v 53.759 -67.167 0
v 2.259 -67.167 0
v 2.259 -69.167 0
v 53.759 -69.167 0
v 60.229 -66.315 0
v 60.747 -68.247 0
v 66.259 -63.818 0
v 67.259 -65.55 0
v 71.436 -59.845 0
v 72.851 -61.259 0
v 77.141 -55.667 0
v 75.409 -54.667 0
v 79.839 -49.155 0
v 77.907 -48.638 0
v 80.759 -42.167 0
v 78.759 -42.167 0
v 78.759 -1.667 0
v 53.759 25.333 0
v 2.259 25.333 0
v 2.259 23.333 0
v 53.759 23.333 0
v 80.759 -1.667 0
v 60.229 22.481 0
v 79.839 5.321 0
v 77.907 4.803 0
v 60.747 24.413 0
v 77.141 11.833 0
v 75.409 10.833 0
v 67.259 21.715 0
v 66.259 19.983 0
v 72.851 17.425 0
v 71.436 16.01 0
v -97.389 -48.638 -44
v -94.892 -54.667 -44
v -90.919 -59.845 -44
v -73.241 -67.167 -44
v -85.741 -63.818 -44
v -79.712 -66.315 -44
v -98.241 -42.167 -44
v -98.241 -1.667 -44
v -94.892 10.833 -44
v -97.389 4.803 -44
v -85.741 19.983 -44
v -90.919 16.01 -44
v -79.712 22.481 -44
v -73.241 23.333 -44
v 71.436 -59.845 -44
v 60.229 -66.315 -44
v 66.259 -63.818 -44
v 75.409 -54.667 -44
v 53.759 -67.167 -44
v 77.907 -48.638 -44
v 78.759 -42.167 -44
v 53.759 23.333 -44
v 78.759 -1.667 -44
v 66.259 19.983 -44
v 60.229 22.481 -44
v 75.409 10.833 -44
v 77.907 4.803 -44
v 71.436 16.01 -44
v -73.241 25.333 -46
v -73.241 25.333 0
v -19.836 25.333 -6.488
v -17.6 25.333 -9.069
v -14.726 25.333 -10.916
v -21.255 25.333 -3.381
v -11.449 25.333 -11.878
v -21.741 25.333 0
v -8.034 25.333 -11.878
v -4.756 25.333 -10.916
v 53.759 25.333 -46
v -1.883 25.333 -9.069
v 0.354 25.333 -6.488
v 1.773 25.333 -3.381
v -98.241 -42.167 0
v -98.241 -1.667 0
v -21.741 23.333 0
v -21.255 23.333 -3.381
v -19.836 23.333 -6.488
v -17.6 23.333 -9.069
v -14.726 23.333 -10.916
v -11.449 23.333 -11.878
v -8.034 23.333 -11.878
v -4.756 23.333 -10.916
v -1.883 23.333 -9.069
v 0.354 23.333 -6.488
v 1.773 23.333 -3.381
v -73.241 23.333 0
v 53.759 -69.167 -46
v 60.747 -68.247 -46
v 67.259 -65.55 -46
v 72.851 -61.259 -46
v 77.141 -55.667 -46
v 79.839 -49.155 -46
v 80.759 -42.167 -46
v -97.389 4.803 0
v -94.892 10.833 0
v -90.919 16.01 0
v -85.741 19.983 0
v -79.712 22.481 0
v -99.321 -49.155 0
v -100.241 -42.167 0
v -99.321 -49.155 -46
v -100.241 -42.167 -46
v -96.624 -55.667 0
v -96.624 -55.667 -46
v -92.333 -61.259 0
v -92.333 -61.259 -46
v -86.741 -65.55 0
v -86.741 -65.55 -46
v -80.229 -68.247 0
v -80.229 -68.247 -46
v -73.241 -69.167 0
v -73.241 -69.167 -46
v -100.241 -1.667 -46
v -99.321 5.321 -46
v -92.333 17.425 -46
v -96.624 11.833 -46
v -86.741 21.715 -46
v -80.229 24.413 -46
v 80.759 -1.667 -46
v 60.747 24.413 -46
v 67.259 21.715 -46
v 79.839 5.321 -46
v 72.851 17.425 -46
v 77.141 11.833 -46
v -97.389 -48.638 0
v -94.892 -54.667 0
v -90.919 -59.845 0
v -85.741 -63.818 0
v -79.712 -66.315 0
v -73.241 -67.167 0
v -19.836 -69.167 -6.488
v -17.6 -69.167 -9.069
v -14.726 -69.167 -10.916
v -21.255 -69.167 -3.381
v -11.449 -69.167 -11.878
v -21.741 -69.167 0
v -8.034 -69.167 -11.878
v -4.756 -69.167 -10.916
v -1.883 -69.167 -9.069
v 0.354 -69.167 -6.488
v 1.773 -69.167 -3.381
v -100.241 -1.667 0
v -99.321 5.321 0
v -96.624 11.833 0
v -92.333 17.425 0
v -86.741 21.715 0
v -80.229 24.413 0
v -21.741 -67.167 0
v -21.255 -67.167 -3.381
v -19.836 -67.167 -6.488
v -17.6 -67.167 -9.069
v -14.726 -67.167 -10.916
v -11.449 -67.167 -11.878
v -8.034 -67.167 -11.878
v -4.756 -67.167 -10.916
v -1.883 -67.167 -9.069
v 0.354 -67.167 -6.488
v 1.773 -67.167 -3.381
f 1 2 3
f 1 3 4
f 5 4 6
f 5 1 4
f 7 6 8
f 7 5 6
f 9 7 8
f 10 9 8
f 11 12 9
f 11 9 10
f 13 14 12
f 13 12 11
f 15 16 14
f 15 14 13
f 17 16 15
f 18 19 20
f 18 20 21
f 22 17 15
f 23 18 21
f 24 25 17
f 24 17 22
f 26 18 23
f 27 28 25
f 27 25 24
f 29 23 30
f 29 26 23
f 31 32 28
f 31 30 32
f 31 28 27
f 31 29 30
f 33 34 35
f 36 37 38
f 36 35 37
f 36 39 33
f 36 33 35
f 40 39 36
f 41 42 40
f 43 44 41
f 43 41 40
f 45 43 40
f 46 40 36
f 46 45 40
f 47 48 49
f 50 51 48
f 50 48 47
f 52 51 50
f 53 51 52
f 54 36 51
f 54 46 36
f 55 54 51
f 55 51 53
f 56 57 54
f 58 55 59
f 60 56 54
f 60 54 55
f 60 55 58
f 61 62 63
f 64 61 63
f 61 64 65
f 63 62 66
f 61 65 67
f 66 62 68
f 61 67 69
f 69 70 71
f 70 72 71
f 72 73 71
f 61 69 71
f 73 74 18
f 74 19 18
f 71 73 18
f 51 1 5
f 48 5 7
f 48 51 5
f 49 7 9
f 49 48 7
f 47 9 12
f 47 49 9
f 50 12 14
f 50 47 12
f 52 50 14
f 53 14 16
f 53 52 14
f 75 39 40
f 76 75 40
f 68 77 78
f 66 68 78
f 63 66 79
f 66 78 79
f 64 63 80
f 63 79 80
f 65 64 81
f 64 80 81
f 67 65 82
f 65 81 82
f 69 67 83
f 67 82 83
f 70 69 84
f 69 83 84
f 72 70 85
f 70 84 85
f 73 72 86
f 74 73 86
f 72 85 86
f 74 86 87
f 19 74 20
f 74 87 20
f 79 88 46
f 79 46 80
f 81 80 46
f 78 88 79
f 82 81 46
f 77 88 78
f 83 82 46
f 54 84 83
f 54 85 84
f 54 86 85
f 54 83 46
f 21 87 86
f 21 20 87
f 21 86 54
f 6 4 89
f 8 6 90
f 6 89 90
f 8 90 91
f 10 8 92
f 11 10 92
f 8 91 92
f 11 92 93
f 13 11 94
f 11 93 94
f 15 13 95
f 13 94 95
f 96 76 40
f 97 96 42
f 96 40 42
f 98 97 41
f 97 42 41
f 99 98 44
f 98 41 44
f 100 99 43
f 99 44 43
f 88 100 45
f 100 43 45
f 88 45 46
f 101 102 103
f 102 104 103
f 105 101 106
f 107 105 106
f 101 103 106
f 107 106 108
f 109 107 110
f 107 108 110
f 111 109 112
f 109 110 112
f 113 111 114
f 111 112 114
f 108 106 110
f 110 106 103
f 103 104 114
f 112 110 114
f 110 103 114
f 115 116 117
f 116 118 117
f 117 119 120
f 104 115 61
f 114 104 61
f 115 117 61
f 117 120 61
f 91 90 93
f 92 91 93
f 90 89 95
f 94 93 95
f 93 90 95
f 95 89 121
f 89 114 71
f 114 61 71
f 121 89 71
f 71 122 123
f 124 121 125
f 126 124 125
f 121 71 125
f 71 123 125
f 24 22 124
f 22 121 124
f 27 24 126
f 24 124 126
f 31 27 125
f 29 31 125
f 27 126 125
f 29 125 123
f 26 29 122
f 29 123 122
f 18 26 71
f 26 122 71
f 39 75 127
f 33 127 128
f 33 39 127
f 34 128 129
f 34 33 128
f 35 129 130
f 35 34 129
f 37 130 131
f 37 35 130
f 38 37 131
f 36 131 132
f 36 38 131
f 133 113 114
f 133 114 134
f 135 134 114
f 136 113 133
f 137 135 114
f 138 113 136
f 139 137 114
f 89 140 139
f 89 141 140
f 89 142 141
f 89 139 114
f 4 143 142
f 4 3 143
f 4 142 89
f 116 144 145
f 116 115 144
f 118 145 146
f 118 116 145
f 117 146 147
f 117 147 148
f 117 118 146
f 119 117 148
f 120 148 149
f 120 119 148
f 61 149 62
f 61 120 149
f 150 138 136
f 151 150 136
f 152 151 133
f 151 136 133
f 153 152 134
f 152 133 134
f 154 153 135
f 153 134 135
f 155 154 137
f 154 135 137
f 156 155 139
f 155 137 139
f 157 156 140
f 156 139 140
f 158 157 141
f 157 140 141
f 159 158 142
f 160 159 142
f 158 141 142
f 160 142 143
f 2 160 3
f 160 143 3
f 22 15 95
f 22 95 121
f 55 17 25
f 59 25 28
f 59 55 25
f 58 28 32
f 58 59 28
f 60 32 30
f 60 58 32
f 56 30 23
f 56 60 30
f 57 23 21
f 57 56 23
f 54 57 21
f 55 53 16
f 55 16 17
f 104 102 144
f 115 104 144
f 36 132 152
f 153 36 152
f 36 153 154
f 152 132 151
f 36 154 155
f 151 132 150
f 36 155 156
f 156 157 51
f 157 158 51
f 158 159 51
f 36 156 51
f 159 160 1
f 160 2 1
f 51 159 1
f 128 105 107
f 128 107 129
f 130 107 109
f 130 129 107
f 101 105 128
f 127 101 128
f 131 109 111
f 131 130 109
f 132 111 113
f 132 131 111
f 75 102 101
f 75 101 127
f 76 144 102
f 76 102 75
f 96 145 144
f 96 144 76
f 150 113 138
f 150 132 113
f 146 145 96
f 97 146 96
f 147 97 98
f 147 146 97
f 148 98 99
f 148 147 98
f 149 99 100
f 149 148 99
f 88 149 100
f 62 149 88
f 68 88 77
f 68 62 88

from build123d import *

# Parameters (mm, degrees)
F0_W     = 181
F0_H     = 94.5
F1_DEPTH = 46
F2_R     = 27
F3_T     = -2
F4_R     = 12
F5_DEPTH = 105


with BuildPart() as f1:
    # F0 (on Top) → F1 (new body)
    with BuildSketch(Plane.XY):
        with Locations((-9.7413412556, -21.9173085093)):
            Rectangle(F0_W, F0_H)
    extrude(amount=-F1_DEPTH)

    # F2
    f2_edges = [f1.edges().sort_by_distance(p)[0] for p in [
        (80.758659, 25.332691, -23),
        (-100.241341, 25.332691, -23),
        (-100.241341, -69.167309, -23),
        (80.758659, -69.167309, -23),
    ]]
    fillet(f2_edges, radius=F2_R)

    # F3
    f3_openings = [f1.faces().sort_by_distance(p)[0] for p in [
        (-9.741341, -21.917309, 0),
    ]]
    offset(amount=F3_T, openings=f3_openings)

    # F4 (on face) → F5 (cut)
    with BuildSketch(Plane.XZ.offset(69.1673085093)):
        with Locations((-9.7413412556, 0)):
            Circle(F4_R)
    extrude(amount=-F5_DEPTH, mode=Mode.SUBTRACT)


solid = f1.part
